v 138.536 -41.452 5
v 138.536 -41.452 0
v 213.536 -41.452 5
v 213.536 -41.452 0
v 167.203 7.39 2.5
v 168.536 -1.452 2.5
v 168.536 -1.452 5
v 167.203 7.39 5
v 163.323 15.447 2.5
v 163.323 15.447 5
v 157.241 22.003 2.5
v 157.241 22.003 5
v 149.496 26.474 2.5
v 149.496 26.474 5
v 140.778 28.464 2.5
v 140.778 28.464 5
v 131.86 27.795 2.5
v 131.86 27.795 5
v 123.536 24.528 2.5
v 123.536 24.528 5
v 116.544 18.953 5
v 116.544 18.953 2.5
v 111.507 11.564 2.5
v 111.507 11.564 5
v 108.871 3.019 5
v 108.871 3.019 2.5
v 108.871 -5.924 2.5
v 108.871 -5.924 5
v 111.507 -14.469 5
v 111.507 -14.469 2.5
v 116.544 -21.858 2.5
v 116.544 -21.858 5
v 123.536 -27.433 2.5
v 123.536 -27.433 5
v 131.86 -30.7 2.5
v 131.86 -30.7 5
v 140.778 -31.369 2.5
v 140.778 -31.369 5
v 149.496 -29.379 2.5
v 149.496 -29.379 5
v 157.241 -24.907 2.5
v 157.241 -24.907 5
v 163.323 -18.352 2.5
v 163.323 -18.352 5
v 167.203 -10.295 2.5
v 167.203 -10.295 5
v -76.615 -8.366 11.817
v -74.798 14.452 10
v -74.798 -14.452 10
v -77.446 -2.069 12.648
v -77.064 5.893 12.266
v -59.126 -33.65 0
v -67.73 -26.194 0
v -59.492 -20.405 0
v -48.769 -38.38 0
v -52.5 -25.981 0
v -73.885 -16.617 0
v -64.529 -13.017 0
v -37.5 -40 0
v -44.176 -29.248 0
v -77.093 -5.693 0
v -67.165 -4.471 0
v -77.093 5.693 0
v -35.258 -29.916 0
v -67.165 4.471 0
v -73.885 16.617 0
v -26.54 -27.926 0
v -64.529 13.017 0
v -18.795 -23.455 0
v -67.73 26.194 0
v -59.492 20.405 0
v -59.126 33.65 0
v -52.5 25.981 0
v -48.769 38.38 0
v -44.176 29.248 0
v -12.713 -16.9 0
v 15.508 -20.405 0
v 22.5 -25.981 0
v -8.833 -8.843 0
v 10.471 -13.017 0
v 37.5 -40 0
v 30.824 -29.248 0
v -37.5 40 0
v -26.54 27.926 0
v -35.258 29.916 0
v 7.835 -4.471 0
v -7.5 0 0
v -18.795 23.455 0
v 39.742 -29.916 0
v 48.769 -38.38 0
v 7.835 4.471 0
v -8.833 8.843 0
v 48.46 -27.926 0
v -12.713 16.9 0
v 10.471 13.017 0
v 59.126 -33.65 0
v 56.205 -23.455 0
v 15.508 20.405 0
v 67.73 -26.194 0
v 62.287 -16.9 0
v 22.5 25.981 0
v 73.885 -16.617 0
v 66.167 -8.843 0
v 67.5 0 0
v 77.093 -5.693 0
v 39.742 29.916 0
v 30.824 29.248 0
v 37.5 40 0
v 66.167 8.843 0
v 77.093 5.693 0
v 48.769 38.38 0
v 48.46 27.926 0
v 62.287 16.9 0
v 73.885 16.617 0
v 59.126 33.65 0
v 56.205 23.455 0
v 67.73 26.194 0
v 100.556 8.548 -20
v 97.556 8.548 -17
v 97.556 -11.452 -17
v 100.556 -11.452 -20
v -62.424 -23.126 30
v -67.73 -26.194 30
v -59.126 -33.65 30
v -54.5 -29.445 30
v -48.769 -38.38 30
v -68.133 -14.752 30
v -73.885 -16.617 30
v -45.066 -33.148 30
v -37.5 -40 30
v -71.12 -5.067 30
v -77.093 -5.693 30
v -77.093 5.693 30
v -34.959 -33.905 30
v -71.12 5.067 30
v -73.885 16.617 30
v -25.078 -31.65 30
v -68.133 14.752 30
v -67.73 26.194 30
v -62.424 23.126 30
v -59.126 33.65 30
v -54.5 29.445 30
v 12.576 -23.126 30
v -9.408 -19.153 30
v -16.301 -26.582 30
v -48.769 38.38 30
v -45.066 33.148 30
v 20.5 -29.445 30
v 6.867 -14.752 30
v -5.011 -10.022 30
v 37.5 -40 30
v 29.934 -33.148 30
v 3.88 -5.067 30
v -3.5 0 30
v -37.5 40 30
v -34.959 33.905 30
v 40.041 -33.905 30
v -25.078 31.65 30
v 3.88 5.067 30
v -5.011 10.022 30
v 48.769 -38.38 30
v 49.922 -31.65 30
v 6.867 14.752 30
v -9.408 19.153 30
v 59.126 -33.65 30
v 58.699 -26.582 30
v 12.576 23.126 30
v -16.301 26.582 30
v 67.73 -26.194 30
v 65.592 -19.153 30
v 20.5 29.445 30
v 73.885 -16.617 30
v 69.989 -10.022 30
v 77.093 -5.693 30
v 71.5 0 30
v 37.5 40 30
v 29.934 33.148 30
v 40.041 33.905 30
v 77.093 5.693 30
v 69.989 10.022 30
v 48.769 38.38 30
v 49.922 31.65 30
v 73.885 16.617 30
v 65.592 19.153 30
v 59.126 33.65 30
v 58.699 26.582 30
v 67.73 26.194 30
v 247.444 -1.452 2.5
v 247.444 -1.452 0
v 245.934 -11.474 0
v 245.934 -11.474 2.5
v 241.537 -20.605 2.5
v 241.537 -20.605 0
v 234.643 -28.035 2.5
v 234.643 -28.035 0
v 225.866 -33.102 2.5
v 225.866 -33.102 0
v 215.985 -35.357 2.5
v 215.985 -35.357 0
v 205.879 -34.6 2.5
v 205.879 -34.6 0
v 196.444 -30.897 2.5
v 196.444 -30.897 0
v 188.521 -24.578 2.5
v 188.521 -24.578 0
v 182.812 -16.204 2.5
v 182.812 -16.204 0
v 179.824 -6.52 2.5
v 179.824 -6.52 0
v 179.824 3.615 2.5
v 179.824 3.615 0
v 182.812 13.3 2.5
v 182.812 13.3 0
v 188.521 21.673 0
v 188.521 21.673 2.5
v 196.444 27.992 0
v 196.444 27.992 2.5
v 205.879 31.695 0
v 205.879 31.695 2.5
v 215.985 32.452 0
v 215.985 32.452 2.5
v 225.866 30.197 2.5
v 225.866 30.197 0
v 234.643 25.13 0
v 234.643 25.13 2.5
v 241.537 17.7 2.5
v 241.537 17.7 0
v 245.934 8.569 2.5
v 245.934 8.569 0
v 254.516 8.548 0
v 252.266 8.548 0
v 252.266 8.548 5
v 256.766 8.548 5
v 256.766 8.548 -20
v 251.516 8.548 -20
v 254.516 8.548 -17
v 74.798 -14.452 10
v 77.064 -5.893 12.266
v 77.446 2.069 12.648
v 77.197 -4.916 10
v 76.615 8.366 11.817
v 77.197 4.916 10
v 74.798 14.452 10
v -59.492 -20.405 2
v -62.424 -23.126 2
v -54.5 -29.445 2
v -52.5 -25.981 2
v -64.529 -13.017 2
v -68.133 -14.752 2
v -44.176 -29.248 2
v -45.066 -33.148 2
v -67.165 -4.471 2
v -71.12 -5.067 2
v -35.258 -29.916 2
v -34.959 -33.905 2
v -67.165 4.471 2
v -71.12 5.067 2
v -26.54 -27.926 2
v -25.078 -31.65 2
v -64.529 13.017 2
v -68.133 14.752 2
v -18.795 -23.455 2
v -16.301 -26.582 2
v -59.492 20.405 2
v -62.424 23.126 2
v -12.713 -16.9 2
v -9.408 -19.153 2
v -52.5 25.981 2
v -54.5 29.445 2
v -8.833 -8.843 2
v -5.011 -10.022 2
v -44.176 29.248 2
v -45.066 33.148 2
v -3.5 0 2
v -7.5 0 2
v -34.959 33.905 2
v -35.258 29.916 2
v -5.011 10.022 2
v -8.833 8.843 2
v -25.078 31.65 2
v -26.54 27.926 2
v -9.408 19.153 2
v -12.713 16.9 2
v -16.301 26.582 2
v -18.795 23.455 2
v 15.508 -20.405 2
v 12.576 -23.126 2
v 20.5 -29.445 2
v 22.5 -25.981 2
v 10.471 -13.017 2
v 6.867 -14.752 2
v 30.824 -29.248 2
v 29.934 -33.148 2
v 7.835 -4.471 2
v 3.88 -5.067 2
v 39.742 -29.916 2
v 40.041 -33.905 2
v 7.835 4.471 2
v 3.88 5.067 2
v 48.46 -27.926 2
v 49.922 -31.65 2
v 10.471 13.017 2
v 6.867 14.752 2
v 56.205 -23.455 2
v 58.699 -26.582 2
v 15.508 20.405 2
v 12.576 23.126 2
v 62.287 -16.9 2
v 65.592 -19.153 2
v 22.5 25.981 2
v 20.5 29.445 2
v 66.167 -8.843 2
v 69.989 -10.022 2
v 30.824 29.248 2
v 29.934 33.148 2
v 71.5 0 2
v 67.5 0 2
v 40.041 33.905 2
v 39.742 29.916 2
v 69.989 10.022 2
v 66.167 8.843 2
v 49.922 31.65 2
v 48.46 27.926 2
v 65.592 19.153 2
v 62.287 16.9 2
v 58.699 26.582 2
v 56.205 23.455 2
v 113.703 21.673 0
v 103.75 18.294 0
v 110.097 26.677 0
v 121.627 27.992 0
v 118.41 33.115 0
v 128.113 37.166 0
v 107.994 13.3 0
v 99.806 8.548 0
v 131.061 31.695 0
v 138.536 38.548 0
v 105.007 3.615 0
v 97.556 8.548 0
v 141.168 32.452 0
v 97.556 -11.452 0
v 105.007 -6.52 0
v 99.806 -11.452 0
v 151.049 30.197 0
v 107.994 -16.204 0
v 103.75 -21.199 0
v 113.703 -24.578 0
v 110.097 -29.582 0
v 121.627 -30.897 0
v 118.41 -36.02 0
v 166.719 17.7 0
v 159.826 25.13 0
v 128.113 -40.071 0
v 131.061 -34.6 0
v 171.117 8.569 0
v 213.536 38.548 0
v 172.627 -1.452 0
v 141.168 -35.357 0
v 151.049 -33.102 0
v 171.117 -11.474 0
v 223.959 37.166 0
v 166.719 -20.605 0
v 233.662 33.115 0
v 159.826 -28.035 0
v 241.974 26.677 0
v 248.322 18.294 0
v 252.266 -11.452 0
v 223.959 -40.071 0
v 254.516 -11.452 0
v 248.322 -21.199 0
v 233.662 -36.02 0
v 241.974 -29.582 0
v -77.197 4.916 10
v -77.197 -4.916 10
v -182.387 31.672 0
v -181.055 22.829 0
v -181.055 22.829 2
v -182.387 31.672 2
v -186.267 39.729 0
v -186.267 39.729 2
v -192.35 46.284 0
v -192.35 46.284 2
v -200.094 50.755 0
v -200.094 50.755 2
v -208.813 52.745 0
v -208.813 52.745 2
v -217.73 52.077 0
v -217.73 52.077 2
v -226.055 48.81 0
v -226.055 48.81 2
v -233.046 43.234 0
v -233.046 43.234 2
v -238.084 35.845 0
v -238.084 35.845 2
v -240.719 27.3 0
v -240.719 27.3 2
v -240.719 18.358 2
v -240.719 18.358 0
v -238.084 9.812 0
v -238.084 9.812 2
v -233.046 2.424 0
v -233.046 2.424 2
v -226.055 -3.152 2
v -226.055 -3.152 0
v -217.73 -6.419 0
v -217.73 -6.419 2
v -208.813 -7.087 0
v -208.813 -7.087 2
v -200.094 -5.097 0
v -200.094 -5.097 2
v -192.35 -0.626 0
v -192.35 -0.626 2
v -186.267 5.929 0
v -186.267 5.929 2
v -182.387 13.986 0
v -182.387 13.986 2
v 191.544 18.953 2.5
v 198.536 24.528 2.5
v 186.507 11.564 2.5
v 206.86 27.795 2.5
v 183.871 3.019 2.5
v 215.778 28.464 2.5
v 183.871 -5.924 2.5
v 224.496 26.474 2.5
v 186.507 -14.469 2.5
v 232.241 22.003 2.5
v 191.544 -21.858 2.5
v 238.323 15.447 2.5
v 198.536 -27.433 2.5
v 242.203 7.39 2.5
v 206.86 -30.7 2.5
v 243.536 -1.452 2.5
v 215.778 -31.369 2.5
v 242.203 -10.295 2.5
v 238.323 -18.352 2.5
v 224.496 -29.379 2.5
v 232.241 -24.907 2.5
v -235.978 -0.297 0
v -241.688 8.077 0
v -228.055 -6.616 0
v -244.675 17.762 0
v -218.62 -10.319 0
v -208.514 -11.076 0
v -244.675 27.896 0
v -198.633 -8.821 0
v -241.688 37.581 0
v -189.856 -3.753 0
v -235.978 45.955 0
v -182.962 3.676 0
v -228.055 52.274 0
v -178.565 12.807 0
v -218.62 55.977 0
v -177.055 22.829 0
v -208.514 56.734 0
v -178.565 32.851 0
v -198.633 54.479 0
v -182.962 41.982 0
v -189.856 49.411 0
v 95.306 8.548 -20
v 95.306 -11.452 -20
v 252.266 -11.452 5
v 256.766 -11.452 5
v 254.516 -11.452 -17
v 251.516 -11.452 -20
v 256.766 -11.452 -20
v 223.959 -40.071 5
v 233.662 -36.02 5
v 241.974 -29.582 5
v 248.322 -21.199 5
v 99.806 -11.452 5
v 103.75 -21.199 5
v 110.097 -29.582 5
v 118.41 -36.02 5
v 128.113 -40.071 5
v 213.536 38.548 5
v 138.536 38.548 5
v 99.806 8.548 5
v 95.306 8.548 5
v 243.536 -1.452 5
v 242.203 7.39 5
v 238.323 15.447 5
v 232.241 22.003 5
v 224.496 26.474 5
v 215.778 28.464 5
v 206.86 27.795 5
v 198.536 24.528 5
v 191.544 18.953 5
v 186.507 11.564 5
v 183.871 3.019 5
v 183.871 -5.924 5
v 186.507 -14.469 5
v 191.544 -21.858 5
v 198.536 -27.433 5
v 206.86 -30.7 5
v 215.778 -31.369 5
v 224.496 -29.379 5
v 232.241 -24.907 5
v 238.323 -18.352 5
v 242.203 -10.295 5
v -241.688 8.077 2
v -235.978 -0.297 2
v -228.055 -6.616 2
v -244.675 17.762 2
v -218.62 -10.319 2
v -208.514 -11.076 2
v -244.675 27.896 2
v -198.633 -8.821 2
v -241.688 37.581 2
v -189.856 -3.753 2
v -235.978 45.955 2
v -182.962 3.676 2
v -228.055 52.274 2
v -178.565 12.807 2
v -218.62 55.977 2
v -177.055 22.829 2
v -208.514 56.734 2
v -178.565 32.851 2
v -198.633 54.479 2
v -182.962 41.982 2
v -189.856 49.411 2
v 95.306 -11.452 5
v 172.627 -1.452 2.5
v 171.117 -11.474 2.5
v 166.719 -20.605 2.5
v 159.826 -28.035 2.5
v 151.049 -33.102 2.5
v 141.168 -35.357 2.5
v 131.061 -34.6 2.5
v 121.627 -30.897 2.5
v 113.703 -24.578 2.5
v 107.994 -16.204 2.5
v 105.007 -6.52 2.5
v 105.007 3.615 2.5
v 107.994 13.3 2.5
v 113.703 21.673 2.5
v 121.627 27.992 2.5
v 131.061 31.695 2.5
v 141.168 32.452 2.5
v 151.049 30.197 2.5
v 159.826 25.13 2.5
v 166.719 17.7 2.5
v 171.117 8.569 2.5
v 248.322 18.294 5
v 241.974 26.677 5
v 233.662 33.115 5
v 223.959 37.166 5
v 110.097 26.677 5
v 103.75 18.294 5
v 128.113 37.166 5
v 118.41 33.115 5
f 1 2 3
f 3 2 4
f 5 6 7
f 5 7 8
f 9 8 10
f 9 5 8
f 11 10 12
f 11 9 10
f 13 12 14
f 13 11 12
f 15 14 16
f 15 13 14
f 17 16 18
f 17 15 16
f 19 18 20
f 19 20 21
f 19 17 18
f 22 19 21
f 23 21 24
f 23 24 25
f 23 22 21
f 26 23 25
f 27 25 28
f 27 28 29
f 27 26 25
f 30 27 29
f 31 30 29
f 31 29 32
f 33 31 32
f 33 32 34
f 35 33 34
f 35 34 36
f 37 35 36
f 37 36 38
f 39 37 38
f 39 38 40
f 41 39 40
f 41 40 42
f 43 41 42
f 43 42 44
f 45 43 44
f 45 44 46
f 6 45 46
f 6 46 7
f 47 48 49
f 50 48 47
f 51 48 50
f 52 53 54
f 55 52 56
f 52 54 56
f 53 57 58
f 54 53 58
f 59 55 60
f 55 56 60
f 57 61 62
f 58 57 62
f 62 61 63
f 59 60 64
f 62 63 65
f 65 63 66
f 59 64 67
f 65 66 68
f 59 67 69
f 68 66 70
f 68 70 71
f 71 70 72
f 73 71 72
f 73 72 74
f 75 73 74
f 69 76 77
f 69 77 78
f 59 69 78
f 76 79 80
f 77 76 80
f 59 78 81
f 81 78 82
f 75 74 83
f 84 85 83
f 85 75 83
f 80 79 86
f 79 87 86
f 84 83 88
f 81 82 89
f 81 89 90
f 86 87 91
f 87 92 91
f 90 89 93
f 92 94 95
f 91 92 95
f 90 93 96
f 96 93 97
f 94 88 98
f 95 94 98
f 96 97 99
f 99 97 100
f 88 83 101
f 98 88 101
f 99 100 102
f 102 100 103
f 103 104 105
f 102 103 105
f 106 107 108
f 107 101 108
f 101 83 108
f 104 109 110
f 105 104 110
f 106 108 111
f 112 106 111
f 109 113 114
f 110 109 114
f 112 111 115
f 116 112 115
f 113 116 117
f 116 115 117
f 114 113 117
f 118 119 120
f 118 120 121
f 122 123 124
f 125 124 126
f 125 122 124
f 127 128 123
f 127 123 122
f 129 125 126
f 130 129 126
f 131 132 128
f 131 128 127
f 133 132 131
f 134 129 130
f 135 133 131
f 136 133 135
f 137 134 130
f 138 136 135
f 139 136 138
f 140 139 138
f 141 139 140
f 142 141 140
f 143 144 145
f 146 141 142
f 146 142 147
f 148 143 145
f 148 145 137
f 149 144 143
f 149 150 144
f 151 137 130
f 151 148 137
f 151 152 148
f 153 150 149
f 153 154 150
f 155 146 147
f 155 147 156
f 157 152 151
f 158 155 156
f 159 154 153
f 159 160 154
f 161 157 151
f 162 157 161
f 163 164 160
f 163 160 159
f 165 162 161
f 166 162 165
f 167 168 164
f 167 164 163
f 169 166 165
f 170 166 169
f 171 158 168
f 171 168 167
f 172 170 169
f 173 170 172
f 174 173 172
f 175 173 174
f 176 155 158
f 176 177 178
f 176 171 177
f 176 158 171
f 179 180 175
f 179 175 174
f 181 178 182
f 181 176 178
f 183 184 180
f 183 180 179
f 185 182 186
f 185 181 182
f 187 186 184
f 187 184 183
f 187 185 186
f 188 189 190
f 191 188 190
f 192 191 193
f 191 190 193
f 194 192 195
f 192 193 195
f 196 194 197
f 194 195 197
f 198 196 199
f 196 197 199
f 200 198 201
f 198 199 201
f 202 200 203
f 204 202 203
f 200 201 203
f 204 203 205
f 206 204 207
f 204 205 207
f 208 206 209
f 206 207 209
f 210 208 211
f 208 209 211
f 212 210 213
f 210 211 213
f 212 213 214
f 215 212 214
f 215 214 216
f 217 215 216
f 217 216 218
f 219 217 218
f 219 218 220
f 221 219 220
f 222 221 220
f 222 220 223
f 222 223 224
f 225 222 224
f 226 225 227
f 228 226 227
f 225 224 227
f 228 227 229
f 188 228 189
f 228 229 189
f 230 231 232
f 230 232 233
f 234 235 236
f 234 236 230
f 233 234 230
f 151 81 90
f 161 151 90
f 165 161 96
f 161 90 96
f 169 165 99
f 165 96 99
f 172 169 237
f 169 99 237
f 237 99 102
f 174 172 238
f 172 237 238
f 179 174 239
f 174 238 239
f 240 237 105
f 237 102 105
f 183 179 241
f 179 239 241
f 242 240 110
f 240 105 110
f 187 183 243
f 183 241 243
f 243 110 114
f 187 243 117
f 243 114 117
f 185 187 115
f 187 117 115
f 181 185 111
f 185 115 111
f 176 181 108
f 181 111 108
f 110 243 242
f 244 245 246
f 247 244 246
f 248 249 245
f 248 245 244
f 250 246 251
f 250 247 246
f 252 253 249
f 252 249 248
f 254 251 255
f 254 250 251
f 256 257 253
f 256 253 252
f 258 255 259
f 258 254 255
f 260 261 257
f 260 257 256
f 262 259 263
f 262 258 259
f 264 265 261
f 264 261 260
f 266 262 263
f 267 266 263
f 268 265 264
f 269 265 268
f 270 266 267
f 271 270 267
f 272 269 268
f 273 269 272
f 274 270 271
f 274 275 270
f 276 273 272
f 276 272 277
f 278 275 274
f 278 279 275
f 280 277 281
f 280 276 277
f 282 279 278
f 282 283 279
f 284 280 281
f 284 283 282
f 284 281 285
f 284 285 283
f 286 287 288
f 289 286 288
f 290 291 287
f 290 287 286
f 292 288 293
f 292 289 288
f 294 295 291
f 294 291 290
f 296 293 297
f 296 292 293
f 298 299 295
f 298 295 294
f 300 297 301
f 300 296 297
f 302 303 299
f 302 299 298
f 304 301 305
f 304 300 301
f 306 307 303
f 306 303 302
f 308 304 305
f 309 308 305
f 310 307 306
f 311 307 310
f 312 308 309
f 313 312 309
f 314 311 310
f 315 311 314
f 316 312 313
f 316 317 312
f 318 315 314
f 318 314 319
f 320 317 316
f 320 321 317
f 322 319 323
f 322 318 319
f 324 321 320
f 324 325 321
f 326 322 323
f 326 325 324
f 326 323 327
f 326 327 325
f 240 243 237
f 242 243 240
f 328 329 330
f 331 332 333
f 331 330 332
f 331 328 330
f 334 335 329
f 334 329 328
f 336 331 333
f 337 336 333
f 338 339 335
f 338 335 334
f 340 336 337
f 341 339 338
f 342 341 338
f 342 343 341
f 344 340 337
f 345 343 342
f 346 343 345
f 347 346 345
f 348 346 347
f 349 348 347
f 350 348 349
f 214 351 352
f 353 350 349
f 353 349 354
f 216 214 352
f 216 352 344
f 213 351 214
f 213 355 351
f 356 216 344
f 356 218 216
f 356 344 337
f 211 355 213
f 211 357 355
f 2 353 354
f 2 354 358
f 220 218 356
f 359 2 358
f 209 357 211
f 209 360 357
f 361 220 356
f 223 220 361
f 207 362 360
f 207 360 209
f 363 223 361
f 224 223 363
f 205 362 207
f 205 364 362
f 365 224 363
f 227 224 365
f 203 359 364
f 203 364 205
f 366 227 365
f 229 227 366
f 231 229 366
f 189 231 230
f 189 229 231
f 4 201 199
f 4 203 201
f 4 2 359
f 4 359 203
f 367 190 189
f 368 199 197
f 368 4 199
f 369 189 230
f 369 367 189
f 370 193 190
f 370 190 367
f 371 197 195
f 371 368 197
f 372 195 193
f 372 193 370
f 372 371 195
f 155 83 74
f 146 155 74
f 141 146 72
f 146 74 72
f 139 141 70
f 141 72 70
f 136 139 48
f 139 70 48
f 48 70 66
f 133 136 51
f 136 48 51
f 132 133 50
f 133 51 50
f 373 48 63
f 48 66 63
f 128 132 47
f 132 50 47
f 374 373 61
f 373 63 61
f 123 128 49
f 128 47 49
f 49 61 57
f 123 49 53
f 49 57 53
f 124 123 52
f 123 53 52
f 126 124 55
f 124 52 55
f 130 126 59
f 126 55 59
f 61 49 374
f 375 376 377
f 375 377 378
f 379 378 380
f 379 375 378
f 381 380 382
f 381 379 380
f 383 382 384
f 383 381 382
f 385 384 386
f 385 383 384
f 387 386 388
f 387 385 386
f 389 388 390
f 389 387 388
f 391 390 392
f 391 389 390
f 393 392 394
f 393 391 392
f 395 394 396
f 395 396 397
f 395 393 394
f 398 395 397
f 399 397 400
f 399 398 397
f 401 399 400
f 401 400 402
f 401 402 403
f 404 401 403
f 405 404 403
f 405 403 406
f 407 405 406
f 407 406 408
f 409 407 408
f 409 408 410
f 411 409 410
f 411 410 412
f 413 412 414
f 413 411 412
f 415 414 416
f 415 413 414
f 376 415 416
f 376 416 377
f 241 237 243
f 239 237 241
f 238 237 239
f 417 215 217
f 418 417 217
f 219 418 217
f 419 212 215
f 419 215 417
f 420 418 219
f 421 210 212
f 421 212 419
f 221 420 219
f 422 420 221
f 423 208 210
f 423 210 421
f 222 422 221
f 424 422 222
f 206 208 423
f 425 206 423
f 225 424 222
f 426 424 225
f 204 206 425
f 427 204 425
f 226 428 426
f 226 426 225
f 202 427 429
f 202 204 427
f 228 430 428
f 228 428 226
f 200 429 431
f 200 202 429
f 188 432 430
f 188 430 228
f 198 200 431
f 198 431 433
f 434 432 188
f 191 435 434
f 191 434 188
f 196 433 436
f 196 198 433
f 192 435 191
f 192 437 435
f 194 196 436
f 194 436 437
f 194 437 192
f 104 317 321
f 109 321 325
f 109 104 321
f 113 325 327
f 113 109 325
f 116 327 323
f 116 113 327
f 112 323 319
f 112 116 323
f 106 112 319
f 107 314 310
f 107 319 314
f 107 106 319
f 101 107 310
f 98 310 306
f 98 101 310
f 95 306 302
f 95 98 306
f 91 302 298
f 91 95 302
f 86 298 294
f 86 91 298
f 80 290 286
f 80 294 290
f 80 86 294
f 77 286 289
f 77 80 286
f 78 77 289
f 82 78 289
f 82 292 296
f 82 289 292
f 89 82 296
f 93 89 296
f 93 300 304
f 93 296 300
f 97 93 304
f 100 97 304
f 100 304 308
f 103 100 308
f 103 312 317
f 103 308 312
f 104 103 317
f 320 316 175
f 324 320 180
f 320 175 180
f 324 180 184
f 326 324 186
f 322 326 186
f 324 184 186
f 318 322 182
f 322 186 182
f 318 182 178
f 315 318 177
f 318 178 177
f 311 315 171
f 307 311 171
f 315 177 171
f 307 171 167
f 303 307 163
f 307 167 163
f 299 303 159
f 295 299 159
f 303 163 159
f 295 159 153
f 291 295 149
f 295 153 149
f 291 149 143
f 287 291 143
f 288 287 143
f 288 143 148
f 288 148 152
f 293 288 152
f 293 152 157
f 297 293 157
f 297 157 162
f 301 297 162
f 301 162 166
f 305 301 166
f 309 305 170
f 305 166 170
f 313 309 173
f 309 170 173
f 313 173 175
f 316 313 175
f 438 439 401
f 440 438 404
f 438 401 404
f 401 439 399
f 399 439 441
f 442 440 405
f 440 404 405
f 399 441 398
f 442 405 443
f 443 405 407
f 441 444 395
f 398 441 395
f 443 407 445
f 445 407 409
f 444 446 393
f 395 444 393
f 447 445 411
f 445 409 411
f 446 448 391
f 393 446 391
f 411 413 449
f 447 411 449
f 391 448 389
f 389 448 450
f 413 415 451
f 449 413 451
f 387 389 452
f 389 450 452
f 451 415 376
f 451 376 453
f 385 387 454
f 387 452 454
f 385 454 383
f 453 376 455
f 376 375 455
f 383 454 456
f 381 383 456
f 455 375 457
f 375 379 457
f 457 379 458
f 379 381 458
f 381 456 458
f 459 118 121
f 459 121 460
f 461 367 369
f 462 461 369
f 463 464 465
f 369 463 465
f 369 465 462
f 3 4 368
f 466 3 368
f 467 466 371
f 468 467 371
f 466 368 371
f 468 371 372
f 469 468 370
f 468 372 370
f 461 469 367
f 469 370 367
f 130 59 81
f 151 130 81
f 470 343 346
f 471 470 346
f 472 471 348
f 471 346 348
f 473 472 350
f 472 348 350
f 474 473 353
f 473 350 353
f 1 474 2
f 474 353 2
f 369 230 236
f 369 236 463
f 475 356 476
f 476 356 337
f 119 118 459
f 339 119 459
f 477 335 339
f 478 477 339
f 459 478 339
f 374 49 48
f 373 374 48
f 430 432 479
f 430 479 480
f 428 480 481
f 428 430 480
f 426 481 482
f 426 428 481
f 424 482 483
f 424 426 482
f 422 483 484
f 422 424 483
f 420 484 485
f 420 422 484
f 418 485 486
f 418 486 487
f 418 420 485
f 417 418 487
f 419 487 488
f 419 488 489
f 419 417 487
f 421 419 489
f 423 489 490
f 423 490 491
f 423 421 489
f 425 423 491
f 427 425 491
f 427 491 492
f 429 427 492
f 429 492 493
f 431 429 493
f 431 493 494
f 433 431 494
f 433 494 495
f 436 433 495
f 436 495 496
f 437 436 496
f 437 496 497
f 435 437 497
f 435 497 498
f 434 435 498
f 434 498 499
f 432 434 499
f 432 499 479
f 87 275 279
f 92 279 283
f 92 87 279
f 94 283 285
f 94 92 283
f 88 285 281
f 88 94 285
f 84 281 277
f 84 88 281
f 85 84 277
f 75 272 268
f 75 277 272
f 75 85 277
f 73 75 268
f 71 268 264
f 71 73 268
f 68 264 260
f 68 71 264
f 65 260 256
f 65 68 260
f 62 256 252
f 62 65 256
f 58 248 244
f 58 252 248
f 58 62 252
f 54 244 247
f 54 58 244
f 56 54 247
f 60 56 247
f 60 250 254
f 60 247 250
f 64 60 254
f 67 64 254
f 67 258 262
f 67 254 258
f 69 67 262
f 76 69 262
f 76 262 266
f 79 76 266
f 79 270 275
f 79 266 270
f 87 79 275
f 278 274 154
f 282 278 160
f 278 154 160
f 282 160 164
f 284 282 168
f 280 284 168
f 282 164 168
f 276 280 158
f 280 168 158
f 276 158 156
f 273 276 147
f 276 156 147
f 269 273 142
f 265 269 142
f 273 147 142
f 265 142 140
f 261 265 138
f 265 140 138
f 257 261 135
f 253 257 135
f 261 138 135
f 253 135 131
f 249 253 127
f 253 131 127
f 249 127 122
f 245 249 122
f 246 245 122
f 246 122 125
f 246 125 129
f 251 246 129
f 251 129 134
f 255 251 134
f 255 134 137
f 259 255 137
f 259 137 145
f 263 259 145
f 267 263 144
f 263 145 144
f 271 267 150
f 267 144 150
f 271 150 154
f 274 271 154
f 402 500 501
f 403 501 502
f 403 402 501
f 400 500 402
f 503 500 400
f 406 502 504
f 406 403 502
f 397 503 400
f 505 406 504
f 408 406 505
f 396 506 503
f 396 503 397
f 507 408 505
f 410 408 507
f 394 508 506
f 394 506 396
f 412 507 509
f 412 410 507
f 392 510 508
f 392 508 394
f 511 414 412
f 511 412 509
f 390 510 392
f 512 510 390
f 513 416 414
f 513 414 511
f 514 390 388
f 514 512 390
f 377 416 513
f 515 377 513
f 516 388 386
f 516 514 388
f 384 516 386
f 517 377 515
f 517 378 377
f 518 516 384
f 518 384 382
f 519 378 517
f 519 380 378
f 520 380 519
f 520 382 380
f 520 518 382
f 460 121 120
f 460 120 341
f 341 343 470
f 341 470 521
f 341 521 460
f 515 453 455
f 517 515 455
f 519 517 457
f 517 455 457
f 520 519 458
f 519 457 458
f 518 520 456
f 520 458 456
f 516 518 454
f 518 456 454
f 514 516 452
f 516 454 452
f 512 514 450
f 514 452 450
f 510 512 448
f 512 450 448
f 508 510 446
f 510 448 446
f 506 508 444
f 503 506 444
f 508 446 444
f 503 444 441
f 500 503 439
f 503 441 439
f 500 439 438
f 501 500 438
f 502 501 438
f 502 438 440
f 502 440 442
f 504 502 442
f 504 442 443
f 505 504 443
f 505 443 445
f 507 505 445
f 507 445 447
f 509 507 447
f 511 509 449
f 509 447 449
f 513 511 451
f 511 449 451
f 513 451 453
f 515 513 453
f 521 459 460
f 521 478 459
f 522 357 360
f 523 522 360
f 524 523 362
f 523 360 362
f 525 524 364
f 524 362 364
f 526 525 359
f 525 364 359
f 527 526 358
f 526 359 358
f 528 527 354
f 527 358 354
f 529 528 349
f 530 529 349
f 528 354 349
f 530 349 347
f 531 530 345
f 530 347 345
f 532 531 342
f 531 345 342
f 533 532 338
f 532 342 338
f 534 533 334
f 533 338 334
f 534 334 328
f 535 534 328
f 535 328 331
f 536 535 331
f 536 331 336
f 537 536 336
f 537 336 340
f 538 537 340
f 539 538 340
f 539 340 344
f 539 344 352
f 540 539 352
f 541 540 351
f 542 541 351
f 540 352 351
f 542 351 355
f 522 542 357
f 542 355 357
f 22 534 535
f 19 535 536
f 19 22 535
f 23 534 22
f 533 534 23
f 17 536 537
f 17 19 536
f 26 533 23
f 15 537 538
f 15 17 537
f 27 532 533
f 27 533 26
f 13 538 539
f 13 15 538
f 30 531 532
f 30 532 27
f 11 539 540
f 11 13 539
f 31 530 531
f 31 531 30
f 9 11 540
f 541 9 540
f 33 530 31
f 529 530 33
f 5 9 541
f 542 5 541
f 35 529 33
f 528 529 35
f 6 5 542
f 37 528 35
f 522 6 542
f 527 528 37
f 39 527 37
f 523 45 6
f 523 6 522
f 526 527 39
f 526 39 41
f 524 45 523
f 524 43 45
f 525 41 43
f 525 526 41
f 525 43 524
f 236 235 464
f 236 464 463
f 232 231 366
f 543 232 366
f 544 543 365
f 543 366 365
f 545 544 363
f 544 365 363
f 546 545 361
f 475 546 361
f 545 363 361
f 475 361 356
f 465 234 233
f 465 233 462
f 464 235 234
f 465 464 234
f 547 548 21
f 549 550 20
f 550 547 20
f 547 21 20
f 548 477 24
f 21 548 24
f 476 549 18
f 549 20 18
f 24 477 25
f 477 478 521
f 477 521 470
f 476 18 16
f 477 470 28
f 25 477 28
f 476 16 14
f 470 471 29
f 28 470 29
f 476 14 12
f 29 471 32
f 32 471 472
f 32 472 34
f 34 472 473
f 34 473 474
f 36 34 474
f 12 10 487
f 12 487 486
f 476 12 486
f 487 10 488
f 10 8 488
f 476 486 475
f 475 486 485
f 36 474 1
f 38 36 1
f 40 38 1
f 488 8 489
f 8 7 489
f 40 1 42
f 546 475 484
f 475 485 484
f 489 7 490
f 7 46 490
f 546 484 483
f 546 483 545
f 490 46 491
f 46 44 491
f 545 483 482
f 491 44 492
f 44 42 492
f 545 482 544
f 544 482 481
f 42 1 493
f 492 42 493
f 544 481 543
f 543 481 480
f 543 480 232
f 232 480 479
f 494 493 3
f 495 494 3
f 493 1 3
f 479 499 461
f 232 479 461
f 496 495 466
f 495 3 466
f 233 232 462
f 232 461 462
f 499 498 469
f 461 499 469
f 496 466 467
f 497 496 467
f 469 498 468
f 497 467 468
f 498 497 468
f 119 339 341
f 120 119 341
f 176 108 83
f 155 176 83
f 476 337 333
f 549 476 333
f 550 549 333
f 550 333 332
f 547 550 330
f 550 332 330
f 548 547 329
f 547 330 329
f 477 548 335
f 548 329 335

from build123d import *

# Parameters (mm, degrees)
F0_R      = 30
F1_DEPTH  = 30
F2_R      = 34
F3_DEPTH  = 28
F4_R      = 34
F4_R_2    = 30
F5_DEPTH  = 2
F6_R      = 30
F7_DEPTH  = 5
F8_R      = 34
F9_DEPTH  = 2.5
F10_W     = 4.5
F10_H     = 20
F11_DEPTH = 5
F12_W     = 2.25
F12_H     = 20
F13_DEPTH = 20
F15_DEPTH = 20
F17_DEPTH = 96.829974


with BuildPart() as f1:
    # F0 (on Top) → F1 (new body)
    with BuildSketch(Plane.XY):
        with BuildLine():
            Line((37.5, 40), (-37.5, 40))
            ThreePointArc((-37.5, 40), (-77.5, 0), (-37.5, -40))
            Line((-37.5, -40), (37.5, -40))
            ThreePointArc((37.5, -40), (77.5, 0), (37.5, 40))
        make_face()
        with Locations((-37.5, 0)):
            Circle(F0_R, mode=Mode.SUBTRACT)
        with Locations((37.5, 0)):
            Circle(F0_R, mode=Mode.SUBTRACT)
    extrude(amount=F1_DEPTH)

    # F2 (on face) → F3 (cut)
    with BuildSketch(Plane.XY.offset(30)):
        with Locations((-37.5, 0)):
            Circle(F2_R)
        with Locations((37.5, 0)):
            Circle(F2_R)
    extrude(amount=-F3_DEPTH, mode=Mode.SUBTRACT)

    # F16 (on face) → F17 (cut, through all)
    with BuildSketch(Plane.XZ.offset(40)):
        Polygon((-74.797963, 10), (-77.797963, 13), (-77.797963, 10), align=None)
        Polygon((77.797963, 13), (74.797963, 10), (77.797963, 10), align=None)
    extrude(amount=-F17_DEPTH, mode=Mode.SUBTRACT)


with BuildPart() as f5:
    # F4 (on Top) → F5 (new body)
    with BuildSketch(Plane.XY):
        with Locations((-211.054564, 22.828974)):
            Circle(F4_R)
        with Locations((-211.054564, 22.828974)):
            Circle(F4_R_2, mode=Mode.SUBTRACT)
    extrude(amount=F5_DEPTH)


with BuildPart() as f7:
    # F6 (on Top) → F7 (new body)
    with BuildSketch(Plane.XY):
        with BuildLine():
            Line((213.535821, 38.547559), (138.535821, 38.547559))
            ThreePointArc((138.535821, 38.547559), (98.535821, -1.452441), (138.535821, -41.452441))
            Line((138.535821, -41.452441), (213.535821, -41.452441))
            ThreePointArc((213.535821, -41.452441), (253.535821, -1.452441), (213.535821, 38.547559))
        make_face()
        with Locations((138.535821, -1.452441)):
            Circle(F6_R, mode=Mode.SUBTRACT)
        with Locations((213.535821, -1.452441)):
            Circle(F6_R, mode=Mode.SUBTRACT)
    extrude(amount=F7_DEPTH)

    # F8 (on face) → F9 (cut)
    with BuildSketch(Plane(origin=(0, 0, 0), x_dir=(1, 0, 0), z_dir=(0, 0, -1))):
        with Locations((138.627172, 1.452441)):
            Circle(F8_R)
        with Locations((213.444471, 1.452441)):
            Circle(F8_R)
    extrude(amount=-F9_DEPTH, mode=Mode.SUBTRACT)

    # F10 (on face) → F11 (join, through all)
    with BuildSketch(Plane(origin=(0, 0, 0), x_dir=(1, 0, 0), z_dir=(0, 0, -1))):
        with Locations((97.555988, 1.452441)):
            Rectangle(F10_W, F10_H)
        with Locations((254.515655, 1.452441)):
            Rectangle(F10_W, F10_H)
    extrude(amount=-F11_DEPTH)

    # F12 (on face) → F13 (join)
    with BuildSketch(Plane(origin=(0, 0, 0), x_dir=(1, 0, 0), z_dir=(0, 0, -1))):
        with Locations((96.430988, 1.452441)):
            Rectangle(F12_W, F12_H)
        with Locations((255.640655, 1.452441)):
            Rectangle(F12_W, F12_H)
    extrude(amount=F13_DEPTH)

    # F14 (on face) → F15 (join, through all)
    with BuildSketch(Plane(origin=(0, 8.547559, 0), x_dir=(-1, 0, 0), z_dir=(0, 1, 0))):
        Polygon((-97.555988, -20), (-97.555988, -17), (-100.555988, -20), align=None)
        Polygon((-251.515655, -20), (-254.515655, -17), (-254.515655, -20), align=None)
    extrude(amount=-F15_DEPTH)


solid = Compound([f1.part, f5.part, f7.part])
